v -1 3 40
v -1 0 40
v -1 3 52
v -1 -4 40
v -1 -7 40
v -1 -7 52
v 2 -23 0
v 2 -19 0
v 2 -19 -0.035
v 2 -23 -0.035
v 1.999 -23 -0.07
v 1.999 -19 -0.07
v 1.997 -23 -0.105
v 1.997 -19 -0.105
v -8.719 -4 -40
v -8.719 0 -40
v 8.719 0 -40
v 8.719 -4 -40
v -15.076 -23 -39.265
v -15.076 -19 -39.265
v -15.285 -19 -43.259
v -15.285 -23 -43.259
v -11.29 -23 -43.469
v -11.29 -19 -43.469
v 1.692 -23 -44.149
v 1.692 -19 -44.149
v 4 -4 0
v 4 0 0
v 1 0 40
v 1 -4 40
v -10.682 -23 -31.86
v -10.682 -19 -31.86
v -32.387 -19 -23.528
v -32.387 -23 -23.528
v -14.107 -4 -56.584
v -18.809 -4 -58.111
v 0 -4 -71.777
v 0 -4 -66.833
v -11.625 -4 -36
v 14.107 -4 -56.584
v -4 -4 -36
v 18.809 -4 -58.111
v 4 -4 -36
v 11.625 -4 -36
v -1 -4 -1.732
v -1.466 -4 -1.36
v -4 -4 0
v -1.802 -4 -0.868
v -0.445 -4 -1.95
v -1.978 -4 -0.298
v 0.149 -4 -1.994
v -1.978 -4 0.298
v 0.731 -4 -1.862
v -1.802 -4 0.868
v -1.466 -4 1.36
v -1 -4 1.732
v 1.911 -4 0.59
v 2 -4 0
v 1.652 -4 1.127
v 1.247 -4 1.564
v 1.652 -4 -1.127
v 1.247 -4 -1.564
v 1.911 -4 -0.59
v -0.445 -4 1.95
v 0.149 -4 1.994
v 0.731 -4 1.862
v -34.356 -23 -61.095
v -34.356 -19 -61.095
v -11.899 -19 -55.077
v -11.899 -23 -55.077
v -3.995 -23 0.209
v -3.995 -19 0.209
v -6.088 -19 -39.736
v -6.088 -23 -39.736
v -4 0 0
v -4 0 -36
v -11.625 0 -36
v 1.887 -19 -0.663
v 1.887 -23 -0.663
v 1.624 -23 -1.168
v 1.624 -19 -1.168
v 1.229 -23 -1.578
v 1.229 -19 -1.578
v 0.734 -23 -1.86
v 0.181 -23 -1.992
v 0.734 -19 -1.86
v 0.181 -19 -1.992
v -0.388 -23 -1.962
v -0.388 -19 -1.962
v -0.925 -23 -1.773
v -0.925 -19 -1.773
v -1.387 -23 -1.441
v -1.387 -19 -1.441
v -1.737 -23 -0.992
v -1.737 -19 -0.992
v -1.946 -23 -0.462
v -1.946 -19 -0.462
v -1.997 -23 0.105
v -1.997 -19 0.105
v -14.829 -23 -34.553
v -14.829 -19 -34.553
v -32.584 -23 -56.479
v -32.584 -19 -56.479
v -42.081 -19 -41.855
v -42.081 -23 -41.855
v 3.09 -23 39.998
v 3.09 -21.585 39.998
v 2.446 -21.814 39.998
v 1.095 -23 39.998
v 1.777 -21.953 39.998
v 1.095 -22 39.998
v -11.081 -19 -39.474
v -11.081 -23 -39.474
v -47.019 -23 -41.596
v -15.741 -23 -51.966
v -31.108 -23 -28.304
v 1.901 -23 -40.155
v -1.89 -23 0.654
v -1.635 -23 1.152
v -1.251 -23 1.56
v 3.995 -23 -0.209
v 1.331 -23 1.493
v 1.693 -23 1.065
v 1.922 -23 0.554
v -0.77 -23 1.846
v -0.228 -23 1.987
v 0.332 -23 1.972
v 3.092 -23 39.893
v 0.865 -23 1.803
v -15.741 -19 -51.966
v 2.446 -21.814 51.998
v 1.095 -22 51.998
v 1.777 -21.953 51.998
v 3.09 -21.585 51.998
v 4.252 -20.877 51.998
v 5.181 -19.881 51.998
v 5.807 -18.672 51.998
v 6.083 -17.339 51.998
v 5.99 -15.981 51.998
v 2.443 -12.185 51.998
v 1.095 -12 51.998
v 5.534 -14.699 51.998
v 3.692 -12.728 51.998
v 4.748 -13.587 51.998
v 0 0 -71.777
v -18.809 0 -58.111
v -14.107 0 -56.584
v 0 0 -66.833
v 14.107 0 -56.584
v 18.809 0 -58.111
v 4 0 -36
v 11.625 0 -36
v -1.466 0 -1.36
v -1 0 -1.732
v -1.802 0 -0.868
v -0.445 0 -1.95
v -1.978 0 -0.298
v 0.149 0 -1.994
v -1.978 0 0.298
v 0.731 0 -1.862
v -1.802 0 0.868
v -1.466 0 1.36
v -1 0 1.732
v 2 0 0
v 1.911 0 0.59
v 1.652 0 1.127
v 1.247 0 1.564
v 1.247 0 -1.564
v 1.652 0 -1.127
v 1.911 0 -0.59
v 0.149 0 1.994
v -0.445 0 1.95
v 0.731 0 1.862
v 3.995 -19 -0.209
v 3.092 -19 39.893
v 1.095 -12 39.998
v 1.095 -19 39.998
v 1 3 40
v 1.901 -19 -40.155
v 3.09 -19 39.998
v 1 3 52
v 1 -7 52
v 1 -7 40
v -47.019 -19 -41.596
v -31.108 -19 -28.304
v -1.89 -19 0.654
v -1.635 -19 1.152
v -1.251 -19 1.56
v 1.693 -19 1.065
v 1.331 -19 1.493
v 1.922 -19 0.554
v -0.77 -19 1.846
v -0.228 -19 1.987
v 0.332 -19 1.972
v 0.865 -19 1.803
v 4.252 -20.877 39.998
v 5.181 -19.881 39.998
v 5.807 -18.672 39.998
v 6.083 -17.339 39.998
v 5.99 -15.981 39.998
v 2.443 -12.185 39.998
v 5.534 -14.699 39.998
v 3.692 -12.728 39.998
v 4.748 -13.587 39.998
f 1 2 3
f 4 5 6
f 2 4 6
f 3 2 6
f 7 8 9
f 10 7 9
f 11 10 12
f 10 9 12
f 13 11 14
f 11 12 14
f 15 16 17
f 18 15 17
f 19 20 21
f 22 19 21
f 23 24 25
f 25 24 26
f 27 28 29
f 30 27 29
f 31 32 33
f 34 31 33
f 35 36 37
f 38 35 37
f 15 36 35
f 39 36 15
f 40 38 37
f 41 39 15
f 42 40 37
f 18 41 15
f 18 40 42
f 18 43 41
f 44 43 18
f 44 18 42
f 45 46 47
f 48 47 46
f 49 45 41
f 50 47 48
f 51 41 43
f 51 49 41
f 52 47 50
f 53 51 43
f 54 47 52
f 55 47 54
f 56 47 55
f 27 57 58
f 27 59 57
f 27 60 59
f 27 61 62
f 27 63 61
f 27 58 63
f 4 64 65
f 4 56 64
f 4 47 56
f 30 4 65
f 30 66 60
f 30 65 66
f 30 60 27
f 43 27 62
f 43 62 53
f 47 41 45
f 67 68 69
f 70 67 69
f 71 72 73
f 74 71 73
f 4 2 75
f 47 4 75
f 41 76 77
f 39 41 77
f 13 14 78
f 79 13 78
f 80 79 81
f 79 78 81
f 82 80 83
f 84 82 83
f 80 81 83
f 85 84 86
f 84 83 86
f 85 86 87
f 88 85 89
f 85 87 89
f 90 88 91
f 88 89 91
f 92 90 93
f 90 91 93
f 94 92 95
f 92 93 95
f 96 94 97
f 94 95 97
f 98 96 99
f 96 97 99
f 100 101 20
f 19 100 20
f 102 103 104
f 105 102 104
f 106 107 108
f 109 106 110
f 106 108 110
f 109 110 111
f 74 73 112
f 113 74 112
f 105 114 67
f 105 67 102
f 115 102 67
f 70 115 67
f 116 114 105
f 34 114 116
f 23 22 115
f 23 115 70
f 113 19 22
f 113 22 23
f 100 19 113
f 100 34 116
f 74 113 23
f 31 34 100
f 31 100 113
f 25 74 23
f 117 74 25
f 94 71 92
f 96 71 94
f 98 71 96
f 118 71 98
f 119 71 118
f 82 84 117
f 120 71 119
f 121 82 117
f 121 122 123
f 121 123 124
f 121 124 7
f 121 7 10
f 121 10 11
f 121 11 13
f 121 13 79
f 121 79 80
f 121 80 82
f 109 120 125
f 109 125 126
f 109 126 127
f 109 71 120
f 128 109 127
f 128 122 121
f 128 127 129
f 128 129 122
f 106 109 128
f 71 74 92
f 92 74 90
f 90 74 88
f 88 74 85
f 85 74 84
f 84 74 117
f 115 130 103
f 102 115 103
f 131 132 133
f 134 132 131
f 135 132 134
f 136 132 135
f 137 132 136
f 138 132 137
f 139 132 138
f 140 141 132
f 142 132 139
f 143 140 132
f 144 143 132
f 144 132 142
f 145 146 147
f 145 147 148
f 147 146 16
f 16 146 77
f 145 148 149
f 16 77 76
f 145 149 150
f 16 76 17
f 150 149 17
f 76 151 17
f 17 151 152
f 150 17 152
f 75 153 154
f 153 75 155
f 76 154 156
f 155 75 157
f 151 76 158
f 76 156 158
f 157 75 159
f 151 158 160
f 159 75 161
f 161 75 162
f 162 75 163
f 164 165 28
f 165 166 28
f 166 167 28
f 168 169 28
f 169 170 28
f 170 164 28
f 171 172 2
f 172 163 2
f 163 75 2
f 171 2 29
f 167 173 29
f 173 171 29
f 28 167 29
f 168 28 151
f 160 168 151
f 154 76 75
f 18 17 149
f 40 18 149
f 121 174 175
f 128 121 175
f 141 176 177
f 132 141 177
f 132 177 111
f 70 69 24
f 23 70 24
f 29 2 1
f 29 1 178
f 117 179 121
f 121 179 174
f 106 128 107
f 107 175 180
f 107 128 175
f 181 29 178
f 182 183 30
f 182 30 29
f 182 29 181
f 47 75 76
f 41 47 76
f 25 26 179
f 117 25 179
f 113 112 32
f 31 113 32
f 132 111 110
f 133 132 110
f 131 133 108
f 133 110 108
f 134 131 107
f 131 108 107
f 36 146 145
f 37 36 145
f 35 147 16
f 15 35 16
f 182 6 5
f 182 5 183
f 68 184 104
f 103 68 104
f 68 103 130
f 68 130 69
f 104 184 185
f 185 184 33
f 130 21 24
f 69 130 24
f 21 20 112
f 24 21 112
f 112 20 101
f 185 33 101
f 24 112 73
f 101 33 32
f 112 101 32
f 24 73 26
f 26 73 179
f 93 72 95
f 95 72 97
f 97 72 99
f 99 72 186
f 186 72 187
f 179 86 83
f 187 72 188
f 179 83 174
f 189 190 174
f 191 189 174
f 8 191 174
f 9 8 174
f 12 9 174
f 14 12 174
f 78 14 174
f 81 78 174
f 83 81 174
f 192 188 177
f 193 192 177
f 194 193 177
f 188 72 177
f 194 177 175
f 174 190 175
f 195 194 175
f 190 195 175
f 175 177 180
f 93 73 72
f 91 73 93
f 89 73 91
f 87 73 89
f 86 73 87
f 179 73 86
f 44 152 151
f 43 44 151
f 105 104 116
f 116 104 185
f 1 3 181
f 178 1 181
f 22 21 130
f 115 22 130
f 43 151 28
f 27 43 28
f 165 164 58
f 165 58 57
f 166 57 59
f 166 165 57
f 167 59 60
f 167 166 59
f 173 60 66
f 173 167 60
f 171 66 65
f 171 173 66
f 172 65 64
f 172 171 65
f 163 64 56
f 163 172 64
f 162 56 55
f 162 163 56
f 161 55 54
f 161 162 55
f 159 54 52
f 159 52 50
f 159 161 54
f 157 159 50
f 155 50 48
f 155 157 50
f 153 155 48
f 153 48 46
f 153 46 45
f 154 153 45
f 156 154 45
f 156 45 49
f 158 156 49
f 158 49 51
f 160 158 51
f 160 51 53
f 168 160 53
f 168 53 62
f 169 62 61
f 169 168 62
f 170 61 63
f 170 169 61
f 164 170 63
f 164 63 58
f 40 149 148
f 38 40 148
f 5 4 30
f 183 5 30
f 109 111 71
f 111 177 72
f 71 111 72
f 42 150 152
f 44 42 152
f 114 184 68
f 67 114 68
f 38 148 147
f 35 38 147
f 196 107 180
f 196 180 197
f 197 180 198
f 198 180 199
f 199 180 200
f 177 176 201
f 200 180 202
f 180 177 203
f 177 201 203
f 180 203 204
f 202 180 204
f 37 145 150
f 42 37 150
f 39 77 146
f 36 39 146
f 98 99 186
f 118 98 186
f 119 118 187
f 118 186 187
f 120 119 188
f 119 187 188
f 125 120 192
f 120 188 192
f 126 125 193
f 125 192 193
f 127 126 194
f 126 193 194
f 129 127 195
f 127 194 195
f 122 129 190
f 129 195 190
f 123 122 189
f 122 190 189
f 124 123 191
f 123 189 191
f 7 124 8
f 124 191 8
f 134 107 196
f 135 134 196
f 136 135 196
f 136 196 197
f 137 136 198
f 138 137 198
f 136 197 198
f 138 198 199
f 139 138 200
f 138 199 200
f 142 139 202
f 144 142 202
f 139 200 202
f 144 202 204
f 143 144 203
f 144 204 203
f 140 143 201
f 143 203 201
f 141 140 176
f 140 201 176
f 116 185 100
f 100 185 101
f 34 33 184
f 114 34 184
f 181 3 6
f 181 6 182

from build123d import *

# Parameters (mm, degrees)
F0_W          = 8
F0_H          = 4
F0_R          = 2
F0_W_2        = 2
F0_H_2        = 12
F1_DEPTH      = 4
F2_W          = 2
F2_H          = 12
F3_DEPTH      = 3
F3_DEPTH_BACK = 7
F6_DEPTH      = 4
F8_DEPTH      = 12


with BuildPart() as f1:
    # F0 (on Front) → F1 (new body)
    with BuildSketch(Plane.XZ):
        with Locations((0, -38)):
            Rectangle(F0_W, F0_H)
        Polygon((4, -36), (4, -40), (8.7185103361, -40), (14.106846055, -56.583592135), (0, -66.83281573), (-14.106846055, -56.583592135), (-8.7185103361, -40), (-4, -40), (-4, -36), (-11.6246804481, -36), (-18.8091280734, -58.11145618), (0, -71.77708764), (18.8091280734, -58.11145618), (11.6246804481, -36), align=None)
        Polygon((-4, -36), (4, -36), (4, 0), (1, 40), (-1, 40), (-4, 0), align=None)
        Circle(F0_R, mode=Mode.SUBTRACT)
        with Locations((0, 46)):
            Rectangle(F0_W_2, F0_H_2)
    extrude(amount=F1_DEPTH)

    # F2 (on face) → F3 (join, two sides)
    with BuildSketch(Plane.XZ.offset(4)) as f3_sk:
        with Locations((0, 46)):
            Rectangle(F2_W, F2_H)
    extrude(amount=F3_DEPTH)
    extrude(f3_sk.sketch, amount=-F3_DEPTH_BACK)


with BuildPart() as f6:
    # F5 (on offset) → F6 (new body)
    with BuildSketch(Plane.XZ.offset(19)):
        with BuildLine():
            Line((1.9972590695, -0.1046719125), (3.994518139, -0.209343825))
            Line((3.994518139, -0.209343825), (3.0920677845, 39.8928454339))
            Line((3.0920677845, 39.8928454339), (1.094808715, 39.9975173464))
            Line((1.094808715, 39.9975173464), (-3.994518139, 0.209343825))
            Line((-3.994518139, 0.209343825), (-1.9972590695, 0.1046719125))
            ThreePointArc((-1.9972590695, 0.1046719125), (0.0523538966, 1.99931465), (2, 0))
            ThreePointArc((2, 0), (1.99931465, -0.0523538966), (1.9972590695, -0.1046719125))
        make_face()
        with BuildLine():
            Line((1.9010798893, -40.1545252152), (3.994518139, -0.209343825))
            Line((3.994518139, -0.209343825), (1.9972590695, -0.1046719125))
            ThreePointArc((1.9972590695, -0.1046719125), (-0.1046719125, -1.9972590695), (-1.9972590695, 0.1046719125))
            Line((-1.9972590695, 0.1046719125), (-3.994518139, 0.209343825))
            Line((-3.994518139, 0.209343825), (-6.0879563887, -39.7358375652))
            Line((-6.0879563887, -39.7358375652), (1.9010798893, -40.1545252152))
        make_face()
        Polygon((1.6917360643, -44.1490433542), (1.9010798893, -40.1545252152), (-6.0879563887, -39.7358375652), (-11.0811040625, -39.474157784), (-11.2904478875, -43.468675923), align=None)
        Polygon((1.094808715, 39.9975173464), (3.0920677845, 39.8928454339), (3.0897122721, 39.9975173464), align=None)
        Polygon((-11.2904478875, -43.468675923), (-11.0811040625, -39.474157784), (-15.0756222015, -39.264813959), (-15.2849660265, -43.259332098), align=None)
        Polygon((-15.0756222015, -39.264813959), (-11.0811040625, -39.474157784), (-10.6820591202, -31.8599266955), (-32.3872073814, -23.5281009029), (-47.0185042723, -41.5962478298), (-34.3559947891, -61.0948025369), (-11.8988366547, -55.0774251506), (-11.2904478875, -43.468675923), (-15.2849660265, -43.259332098), (-15.741257602, -51.9658940187), (-32.5841262027, -56.4789270585), (-42.0810083151, -41.8550110281), (-31.107535647, -28.3039008329), (-14.828674451, -34.5527701774), align=None)
    extrude(amount=F6_DEPTH)

    # F7 (on face) → F8 (join)
    with BuildSketch(Plane.XY.offset(39.9975173464)):
        with BuildLine():
            Line((3.0897122721, -19), (1.094808715, -19))
            Line((1.094808715, -19), (1.094808715, -22))
            ThreePointArc((1.094808715, -22), (2.1136357454, -21.8950987204), (3.0897122721, -21.5847965929))
            Line((3.0897122721, -21.5847965929), (3.0897122721, -19))
        make_face()
        with BuildLine():
            ThreePointArc((3.0897122721, -21.5847965929), (5.9899074353, -15.9811729696), (1.094808715, -12))
            Line((1.094808715, -12), (1.094808715, -19))
            Line((1.094808715, -19), (3.0897122721, -19))
            Line((3.0897122721, -19), (3.0897122721, -21.5847965929))
        make_face()
    extrude(amount=F8_DEPTH)


solid = Compound([f1.part, f6.part])
